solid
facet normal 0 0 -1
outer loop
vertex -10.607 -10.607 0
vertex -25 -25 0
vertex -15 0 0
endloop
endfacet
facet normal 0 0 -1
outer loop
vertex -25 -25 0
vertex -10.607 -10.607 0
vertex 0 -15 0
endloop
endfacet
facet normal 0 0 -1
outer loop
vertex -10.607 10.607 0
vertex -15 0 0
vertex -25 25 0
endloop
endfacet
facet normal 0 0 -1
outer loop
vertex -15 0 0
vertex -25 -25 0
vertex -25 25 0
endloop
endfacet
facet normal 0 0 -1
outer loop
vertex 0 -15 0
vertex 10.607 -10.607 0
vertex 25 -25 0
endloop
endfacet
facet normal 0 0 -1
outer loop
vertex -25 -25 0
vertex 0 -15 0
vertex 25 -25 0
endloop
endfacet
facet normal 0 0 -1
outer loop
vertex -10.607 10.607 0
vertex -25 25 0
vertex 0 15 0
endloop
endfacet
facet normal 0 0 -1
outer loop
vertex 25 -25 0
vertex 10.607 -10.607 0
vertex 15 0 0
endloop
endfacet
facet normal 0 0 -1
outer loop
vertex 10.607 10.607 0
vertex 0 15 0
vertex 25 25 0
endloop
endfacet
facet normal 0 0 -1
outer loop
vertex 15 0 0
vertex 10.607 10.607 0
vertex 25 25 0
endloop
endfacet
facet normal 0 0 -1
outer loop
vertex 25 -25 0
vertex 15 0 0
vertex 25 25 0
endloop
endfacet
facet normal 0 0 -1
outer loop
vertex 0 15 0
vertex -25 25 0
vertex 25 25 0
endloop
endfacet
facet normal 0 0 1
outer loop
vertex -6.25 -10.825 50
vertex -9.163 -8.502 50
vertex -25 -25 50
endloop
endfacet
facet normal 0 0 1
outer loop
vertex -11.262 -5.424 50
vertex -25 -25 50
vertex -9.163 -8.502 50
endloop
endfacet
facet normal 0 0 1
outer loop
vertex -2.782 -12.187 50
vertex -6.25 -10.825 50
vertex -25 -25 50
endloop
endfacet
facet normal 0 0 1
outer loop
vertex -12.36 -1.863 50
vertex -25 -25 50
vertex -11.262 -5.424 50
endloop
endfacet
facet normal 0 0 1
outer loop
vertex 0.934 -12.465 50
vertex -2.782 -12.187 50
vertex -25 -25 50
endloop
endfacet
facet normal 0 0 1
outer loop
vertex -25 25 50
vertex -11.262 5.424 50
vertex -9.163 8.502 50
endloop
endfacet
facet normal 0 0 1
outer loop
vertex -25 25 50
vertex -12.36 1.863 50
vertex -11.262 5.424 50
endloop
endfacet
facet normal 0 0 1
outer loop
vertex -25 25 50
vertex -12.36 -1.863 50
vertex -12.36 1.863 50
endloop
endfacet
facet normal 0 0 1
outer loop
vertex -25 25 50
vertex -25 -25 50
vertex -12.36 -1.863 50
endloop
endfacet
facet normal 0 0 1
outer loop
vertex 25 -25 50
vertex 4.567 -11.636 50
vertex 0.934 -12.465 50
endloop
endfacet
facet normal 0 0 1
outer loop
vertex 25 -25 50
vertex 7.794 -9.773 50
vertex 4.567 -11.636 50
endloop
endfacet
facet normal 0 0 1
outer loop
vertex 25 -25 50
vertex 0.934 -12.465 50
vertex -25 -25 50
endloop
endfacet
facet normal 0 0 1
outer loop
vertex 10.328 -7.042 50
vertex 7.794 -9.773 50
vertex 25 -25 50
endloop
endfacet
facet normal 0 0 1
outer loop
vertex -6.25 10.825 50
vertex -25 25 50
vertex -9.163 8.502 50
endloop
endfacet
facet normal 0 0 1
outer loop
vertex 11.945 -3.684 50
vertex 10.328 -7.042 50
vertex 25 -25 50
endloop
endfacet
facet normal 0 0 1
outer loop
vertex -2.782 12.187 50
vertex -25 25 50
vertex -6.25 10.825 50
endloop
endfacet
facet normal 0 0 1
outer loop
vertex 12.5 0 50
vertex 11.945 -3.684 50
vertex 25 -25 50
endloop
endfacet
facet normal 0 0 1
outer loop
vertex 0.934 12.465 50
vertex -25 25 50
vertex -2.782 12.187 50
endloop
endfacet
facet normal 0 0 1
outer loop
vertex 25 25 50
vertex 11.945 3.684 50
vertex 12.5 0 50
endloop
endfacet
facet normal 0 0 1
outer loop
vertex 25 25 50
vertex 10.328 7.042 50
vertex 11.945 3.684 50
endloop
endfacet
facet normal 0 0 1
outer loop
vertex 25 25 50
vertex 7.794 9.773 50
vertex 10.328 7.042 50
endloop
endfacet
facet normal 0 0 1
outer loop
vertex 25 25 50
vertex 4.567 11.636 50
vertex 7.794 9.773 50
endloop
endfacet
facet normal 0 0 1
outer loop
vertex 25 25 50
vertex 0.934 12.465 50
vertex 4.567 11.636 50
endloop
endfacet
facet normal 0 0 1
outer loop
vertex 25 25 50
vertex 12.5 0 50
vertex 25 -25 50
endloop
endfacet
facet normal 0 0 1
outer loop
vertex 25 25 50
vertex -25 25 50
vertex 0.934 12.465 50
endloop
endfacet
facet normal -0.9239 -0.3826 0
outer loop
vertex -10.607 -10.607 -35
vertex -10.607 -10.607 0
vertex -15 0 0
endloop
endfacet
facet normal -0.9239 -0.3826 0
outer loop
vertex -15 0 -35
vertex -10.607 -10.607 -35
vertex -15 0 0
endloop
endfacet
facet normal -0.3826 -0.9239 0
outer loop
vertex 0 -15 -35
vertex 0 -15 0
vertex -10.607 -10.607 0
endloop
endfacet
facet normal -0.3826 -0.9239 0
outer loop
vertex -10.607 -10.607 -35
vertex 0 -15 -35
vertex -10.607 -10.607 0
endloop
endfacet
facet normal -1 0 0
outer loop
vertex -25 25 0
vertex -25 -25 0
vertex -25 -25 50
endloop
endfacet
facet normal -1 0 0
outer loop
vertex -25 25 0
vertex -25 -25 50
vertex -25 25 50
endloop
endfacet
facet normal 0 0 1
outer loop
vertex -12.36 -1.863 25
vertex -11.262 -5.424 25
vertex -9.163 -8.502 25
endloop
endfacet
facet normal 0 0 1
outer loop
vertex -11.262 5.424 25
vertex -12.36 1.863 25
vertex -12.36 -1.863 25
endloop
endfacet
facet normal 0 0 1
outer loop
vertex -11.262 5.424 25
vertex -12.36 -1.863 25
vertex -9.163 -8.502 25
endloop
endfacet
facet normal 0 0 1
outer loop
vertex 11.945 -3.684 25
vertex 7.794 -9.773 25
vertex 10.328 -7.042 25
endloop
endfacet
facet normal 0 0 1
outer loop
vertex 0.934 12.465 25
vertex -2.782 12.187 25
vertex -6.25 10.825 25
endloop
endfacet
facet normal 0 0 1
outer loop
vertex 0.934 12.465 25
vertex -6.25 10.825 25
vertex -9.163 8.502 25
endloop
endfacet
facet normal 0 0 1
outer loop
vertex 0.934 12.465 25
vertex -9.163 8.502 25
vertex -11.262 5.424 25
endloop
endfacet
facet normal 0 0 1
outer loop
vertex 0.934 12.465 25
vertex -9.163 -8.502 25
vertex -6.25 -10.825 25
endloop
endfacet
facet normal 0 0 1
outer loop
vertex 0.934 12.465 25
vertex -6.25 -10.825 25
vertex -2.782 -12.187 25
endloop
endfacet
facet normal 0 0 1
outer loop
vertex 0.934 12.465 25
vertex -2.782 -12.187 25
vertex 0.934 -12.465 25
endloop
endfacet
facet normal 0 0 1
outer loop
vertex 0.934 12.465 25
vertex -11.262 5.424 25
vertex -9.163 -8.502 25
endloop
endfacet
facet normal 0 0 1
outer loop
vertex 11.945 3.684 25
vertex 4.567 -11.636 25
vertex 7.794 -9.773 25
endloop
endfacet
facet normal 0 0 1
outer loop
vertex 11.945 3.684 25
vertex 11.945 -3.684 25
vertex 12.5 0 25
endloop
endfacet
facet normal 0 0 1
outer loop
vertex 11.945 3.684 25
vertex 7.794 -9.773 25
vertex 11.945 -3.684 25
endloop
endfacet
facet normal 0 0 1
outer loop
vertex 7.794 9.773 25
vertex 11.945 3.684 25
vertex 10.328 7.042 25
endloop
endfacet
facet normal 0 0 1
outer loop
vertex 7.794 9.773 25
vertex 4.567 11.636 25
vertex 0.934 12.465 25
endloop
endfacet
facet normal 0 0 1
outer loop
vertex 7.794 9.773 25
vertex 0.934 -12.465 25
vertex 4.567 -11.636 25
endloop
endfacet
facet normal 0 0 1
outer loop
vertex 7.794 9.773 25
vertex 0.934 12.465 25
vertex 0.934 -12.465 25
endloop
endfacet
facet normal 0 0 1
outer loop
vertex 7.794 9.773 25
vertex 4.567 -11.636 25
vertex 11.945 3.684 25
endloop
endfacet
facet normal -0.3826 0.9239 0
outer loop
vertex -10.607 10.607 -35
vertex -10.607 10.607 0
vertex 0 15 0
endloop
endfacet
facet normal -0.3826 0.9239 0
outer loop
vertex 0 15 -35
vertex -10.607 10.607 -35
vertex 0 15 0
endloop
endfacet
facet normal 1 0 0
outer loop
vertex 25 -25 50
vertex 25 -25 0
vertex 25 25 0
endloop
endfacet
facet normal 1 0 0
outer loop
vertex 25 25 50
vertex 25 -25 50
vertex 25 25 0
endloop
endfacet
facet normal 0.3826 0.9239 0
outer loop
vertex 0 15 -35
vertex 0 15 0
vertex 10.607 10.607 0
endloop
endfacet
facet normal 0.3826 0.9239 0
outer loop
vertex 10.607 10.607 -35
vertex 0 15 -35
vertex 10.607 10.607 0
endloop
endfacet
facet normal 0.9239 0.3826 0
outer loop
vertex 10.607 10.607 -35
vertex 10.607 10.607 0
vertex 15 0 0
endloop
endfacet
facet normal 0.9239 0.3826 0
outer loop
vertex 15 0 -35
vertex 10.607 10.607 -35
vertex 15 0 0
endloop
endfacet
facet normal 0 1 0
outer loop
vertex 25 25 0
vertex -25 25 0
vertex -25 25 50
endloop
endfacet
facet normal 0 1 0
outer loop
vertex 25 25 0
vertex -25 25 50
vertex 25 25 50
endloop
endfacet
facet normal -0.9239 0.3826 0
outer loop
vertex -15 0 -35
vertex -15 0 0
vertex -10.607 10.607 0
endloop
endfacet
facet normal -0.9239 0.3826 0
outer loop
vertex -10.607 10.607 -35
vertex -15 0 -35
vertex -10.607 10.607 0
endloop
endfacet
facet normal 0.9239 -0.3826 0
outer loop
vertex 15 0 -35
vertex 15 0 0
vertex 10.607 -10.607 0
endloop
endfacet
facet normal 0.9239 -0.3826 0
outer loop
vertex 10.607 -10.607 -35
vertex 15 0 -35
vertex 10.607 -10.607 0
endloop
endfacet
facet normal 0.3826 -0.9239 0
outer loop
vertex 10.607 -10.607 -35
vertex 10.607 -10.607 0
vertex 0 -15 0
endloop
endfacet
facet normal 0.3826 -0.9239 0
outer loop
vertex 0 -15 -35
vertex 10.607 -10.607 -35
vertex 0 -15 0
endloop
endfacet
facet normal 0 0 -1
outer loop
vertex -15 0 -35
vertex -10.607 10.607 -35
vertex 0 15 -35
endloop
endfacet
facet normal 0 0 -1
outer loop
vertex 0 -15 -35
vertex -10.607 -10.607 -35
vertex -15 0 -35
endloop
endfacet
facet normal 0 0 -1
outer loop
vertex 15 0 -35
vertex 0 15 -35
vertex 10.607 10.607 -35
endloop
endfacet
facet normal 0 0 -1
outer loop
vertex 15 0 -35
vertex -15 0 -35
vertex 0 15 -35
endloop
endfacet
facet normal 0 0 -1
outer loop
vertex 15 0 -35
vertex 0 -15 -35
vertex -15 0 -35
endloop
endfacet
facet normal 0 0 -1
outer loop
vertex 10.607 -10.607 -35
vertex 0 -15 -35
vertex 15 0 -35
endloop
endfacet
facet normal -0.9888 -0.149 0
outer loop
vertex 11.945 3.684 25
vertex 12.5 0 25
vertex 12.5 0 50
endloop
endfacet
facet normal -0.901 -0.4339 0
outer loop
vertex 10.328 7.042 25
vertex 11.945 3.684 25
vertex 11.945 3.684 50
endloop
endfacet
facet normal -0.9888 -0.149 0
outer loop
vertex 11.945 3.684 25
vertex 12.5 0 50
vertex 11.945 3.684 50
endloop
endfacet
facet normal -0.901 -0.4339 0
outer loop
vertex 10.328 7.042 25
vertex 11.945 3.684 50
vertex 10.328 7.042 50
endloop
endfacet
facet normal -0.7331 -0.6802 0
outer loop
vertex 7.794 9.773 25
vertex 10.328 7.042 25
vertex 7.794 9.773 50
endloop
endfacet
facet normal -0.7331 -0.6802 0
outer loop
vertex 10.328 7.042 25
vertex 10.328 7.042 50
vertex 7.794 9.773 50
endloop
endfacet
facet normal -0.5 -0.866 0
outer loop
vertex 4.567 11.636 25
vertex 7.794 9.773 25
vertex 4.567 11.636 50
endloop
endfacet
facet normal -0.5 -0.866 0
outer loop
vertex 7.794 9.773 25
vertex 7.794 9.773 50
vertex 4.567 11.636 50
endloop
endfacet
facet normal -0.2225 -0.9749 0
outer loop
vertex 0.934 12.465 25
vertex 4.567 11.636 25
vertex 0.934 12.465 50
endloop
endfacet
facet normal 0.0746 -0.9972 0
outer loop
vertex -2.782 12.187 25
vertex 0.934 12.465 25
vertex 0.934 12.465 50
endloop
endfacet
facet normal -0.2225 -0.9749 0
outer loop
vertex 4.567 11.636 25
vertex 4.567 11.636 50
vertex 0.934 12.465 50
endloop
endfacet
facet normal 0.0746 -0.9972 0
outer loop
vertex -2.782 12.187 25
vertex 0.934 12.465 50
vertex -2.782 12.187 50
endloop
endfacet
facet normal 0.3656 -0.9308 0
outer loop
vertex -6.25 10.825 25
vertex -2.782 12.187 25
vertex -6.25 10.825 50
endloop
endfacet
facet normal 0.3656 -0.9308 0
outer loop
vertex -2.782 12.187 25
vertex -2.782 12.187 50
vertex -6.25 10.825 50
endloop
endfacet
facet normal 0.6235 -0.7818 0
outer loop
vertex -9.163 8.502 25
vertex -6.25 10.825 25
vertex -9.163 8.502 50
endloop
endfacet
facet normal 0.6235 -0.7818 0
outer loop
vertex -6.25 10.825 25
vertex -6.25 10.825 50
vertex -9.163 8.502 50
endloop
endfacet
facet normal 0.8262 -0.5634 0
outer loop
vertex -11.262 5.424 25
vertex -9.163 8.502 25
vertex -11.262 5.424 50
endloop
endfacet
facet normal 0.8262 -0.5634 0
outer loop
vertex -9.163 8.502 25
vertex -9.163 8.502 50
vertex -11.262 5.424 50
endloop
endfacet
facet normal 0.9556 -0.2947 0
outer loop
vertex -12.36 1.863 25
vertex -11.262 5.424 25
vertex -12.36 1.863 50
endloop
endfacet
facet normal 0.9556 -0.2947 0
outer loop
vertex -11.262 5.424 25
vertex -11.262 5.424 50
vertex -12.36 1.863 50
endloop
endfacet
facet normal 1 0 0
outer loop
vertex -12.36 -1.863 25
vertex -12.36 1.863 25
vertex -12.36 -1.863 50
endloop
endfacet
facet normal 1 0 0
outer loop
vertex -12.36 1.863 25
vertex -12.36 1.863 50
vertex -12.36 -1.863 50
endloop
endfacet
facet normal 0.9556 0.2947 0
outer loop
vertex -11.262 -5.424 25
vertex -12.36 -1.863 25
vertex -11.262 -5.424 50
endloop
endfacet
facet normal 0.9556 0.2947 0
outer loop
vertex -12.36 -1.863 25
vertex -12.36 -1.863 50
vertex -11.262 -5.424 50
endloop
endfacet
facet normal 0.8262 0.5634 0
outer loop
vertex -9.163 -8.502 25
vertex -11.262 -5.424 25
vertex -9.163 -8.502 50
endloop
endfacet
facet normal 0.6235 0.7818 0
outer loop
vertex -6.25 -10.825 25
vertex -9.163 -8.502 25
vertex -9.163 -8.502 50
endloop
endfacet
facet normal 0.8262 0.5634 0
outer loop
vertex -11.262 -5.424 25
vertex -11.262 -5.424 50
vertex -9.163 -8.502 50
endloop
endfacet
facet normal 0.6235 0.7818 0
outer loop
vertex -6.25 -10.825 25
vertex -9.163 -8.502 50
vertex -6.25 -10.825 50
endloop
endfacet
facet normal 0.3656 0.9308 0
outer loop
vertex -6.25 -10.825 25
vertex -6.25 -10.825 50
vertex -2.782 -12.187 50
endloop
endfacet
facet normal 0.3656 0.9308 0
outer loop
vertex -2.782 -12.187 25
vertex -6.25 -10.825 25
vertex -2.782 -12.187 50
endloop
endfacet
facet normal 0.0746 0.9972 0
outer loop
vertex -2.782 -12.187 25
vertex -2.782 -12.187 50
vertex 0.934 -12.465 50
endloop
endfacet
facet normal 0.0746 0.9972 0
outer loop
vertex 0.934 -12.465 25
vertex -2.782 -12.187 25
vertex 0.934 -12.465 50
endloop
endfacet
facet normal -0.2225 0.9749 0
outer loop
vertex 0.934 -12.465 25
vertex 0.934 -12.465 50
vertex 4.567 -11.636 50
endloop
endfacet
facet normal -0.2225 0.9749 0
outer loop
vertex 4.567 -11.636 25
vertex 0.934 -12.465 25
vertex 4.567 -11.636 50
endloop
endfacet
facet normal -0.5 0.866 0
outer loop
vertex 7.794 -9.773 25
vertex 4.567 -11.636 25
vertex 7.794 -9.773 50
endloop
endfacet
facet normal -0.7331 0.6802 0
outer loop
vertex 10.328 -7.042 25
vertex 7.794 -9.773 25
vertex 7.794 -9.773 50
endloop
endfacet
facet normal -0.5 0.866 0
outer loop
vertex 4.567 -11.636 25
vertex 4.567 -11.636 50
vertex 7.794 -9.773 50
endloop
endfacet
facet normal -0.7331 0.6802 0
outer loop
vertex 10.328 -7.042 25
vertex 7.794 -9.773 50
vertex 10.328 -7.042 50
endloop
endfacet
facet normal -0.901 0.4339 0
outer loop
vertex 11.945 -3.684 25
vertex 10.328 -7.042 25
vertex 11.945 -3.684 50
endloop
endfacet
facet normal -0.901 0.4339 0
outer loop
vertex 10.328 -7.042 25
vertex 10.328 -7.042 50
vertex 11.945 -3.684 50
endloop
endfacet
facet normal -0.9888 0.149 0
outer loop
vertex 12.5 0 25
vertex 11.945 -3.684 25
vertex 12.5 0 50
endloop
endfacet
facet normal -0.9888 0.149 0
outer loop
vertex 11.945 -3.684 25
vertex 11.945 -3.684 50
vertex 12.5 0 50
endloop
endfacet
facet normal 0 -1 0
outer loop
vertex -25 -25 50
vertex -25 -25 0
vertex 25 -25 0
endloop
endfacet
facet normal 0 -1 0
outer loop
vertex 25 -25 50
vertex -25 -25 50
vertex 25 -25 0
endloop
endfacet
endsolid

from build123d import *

# Parameters (mm, degrees)
F0_W     = 50
F0_H     = 50
F1_DEPTH = 50
F2_R     = 12.5
F3_DEPTH = 25
F5_DEPTH = 35


with BuildPart() as f1:
    # F0 (on Top) → F1 (new body)
    with BuildSketch(Plane.XY):
        Rectangle(F0_W, F0_H)
    extrude(amount=F1_DEPTH)

    # F2 (on face) → F3 (cut)
    with BuildSketch(Plane.XY.offset(50)):
        Circle(F2_R)
    extrude(amount=-F3_DEPTH, mode=Mode.SUBTRACT)

    # F4 (on face) → F5 (join)
    with BuildSketch(Plane(origin=(0, 0, 0), x_dir=(1, 0, 0), z_dir=(0, 0, -1))):
        Polygon((0, 15), (-10.606602, 10.606602), (-15, 0), (-10.606602, -10.606602), (0, -15), (10.606602, -10.606602), (15, 0), (10.606602, 10.606602), align=None)
    extrude(amount=F5_DEPTH)


solid = f1.part
